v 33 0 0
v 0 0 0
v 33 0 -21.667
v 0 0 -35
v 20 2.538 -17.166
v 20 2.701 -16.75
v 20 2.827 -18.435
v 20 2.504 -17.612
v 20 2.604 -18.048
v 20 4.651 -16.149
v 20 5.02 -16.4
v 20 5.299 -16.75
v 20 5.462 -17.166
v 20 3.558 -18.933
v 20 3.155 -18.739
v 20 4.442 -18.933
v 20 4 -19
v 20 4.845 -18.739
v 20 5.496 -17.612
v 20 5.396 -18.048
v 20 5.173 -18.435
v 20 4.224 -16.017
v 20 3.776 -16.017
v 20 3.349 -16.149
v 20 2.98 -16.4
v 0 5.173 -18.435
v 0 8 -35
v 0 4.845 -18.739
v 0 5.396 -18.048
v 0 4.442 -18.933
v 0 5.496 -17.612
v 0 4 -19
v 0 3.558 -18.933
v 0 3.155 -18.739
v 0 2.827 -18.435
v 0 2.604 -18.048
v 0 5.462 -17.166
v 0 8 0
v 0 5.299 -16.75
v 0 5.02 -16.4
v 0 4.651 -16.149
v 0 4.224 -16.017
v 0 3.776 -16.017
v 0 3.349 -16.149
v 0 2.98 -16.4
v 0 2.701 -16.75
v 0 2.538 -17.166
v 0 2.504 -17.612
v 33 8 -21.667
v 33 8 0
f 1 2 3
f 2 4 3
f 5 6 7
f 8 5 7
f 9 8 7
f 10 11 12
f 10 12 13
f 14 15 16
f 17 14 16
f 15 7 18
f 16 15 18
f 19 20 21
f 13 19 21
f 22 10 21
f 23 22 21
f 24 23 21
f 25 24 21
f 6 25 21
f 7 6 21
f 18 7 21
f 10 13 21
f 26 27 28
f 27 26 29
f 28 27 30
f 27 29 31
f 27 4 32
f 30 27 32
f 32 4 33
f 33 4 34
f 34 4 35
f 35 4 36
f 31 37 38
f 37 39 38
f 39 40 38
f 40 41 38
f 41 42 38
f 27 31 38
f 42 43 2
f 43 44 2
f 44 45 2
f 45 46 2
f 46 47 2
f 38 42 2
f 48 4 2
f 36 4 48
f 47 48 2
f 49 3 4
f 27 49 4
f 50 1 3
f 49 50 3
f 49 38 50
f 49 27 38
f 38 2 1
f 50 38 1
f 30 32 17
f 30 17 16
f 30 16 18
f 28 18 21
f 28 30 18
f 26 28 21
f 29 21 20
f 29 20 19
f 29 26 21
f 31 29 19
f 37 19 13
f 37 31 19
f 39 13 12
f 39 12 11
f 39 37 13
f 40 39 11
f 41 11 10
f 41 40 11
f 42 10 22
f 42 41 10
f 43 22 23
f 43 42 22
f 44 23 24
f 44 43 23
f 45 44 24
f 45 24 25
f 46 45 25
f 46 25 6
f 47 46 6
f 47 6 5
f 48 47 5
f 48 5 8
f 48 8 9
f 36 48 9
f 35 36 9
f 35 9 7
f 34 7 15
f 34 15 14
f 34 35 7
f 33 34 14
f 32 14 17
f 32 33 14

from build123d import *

# Parameters (mm, degrees)
BOSS_EXTRUDE2_DEPTH = 8
SKETCH2_R           = 1.5
CUT_EXTRUDE1_DEPTH  = 20


with BuildPart() as part:
    # Sketch1 → Boss-Extrude2 (new body)
    with BuildSketch(Plane(origin=(0, 0, 0), x_dir=(1, 0, 0), z_dir=(0, 1, 0))):
        Polygon((0, 0), (33, 0), (33, 21.667134547), (0, 35), align=None)
    extrude(amount=BOSS_EXTRUDE2_DEPTH)

    # Sketch2 → Cut-Extrude1 (cut)
    with BuildSketch(Plane(origin=(0, 0, 0), x_dir=(0, 0, -1), z_dir=(1, 0, 0))):
        with Locations((17.5, 4)):
            Circle(SKETCH2_R)
    extrude(amount=CUT_EXTRUDE1_DEPTH, mode=Mode.SUBTRACT)


solid = part.part
